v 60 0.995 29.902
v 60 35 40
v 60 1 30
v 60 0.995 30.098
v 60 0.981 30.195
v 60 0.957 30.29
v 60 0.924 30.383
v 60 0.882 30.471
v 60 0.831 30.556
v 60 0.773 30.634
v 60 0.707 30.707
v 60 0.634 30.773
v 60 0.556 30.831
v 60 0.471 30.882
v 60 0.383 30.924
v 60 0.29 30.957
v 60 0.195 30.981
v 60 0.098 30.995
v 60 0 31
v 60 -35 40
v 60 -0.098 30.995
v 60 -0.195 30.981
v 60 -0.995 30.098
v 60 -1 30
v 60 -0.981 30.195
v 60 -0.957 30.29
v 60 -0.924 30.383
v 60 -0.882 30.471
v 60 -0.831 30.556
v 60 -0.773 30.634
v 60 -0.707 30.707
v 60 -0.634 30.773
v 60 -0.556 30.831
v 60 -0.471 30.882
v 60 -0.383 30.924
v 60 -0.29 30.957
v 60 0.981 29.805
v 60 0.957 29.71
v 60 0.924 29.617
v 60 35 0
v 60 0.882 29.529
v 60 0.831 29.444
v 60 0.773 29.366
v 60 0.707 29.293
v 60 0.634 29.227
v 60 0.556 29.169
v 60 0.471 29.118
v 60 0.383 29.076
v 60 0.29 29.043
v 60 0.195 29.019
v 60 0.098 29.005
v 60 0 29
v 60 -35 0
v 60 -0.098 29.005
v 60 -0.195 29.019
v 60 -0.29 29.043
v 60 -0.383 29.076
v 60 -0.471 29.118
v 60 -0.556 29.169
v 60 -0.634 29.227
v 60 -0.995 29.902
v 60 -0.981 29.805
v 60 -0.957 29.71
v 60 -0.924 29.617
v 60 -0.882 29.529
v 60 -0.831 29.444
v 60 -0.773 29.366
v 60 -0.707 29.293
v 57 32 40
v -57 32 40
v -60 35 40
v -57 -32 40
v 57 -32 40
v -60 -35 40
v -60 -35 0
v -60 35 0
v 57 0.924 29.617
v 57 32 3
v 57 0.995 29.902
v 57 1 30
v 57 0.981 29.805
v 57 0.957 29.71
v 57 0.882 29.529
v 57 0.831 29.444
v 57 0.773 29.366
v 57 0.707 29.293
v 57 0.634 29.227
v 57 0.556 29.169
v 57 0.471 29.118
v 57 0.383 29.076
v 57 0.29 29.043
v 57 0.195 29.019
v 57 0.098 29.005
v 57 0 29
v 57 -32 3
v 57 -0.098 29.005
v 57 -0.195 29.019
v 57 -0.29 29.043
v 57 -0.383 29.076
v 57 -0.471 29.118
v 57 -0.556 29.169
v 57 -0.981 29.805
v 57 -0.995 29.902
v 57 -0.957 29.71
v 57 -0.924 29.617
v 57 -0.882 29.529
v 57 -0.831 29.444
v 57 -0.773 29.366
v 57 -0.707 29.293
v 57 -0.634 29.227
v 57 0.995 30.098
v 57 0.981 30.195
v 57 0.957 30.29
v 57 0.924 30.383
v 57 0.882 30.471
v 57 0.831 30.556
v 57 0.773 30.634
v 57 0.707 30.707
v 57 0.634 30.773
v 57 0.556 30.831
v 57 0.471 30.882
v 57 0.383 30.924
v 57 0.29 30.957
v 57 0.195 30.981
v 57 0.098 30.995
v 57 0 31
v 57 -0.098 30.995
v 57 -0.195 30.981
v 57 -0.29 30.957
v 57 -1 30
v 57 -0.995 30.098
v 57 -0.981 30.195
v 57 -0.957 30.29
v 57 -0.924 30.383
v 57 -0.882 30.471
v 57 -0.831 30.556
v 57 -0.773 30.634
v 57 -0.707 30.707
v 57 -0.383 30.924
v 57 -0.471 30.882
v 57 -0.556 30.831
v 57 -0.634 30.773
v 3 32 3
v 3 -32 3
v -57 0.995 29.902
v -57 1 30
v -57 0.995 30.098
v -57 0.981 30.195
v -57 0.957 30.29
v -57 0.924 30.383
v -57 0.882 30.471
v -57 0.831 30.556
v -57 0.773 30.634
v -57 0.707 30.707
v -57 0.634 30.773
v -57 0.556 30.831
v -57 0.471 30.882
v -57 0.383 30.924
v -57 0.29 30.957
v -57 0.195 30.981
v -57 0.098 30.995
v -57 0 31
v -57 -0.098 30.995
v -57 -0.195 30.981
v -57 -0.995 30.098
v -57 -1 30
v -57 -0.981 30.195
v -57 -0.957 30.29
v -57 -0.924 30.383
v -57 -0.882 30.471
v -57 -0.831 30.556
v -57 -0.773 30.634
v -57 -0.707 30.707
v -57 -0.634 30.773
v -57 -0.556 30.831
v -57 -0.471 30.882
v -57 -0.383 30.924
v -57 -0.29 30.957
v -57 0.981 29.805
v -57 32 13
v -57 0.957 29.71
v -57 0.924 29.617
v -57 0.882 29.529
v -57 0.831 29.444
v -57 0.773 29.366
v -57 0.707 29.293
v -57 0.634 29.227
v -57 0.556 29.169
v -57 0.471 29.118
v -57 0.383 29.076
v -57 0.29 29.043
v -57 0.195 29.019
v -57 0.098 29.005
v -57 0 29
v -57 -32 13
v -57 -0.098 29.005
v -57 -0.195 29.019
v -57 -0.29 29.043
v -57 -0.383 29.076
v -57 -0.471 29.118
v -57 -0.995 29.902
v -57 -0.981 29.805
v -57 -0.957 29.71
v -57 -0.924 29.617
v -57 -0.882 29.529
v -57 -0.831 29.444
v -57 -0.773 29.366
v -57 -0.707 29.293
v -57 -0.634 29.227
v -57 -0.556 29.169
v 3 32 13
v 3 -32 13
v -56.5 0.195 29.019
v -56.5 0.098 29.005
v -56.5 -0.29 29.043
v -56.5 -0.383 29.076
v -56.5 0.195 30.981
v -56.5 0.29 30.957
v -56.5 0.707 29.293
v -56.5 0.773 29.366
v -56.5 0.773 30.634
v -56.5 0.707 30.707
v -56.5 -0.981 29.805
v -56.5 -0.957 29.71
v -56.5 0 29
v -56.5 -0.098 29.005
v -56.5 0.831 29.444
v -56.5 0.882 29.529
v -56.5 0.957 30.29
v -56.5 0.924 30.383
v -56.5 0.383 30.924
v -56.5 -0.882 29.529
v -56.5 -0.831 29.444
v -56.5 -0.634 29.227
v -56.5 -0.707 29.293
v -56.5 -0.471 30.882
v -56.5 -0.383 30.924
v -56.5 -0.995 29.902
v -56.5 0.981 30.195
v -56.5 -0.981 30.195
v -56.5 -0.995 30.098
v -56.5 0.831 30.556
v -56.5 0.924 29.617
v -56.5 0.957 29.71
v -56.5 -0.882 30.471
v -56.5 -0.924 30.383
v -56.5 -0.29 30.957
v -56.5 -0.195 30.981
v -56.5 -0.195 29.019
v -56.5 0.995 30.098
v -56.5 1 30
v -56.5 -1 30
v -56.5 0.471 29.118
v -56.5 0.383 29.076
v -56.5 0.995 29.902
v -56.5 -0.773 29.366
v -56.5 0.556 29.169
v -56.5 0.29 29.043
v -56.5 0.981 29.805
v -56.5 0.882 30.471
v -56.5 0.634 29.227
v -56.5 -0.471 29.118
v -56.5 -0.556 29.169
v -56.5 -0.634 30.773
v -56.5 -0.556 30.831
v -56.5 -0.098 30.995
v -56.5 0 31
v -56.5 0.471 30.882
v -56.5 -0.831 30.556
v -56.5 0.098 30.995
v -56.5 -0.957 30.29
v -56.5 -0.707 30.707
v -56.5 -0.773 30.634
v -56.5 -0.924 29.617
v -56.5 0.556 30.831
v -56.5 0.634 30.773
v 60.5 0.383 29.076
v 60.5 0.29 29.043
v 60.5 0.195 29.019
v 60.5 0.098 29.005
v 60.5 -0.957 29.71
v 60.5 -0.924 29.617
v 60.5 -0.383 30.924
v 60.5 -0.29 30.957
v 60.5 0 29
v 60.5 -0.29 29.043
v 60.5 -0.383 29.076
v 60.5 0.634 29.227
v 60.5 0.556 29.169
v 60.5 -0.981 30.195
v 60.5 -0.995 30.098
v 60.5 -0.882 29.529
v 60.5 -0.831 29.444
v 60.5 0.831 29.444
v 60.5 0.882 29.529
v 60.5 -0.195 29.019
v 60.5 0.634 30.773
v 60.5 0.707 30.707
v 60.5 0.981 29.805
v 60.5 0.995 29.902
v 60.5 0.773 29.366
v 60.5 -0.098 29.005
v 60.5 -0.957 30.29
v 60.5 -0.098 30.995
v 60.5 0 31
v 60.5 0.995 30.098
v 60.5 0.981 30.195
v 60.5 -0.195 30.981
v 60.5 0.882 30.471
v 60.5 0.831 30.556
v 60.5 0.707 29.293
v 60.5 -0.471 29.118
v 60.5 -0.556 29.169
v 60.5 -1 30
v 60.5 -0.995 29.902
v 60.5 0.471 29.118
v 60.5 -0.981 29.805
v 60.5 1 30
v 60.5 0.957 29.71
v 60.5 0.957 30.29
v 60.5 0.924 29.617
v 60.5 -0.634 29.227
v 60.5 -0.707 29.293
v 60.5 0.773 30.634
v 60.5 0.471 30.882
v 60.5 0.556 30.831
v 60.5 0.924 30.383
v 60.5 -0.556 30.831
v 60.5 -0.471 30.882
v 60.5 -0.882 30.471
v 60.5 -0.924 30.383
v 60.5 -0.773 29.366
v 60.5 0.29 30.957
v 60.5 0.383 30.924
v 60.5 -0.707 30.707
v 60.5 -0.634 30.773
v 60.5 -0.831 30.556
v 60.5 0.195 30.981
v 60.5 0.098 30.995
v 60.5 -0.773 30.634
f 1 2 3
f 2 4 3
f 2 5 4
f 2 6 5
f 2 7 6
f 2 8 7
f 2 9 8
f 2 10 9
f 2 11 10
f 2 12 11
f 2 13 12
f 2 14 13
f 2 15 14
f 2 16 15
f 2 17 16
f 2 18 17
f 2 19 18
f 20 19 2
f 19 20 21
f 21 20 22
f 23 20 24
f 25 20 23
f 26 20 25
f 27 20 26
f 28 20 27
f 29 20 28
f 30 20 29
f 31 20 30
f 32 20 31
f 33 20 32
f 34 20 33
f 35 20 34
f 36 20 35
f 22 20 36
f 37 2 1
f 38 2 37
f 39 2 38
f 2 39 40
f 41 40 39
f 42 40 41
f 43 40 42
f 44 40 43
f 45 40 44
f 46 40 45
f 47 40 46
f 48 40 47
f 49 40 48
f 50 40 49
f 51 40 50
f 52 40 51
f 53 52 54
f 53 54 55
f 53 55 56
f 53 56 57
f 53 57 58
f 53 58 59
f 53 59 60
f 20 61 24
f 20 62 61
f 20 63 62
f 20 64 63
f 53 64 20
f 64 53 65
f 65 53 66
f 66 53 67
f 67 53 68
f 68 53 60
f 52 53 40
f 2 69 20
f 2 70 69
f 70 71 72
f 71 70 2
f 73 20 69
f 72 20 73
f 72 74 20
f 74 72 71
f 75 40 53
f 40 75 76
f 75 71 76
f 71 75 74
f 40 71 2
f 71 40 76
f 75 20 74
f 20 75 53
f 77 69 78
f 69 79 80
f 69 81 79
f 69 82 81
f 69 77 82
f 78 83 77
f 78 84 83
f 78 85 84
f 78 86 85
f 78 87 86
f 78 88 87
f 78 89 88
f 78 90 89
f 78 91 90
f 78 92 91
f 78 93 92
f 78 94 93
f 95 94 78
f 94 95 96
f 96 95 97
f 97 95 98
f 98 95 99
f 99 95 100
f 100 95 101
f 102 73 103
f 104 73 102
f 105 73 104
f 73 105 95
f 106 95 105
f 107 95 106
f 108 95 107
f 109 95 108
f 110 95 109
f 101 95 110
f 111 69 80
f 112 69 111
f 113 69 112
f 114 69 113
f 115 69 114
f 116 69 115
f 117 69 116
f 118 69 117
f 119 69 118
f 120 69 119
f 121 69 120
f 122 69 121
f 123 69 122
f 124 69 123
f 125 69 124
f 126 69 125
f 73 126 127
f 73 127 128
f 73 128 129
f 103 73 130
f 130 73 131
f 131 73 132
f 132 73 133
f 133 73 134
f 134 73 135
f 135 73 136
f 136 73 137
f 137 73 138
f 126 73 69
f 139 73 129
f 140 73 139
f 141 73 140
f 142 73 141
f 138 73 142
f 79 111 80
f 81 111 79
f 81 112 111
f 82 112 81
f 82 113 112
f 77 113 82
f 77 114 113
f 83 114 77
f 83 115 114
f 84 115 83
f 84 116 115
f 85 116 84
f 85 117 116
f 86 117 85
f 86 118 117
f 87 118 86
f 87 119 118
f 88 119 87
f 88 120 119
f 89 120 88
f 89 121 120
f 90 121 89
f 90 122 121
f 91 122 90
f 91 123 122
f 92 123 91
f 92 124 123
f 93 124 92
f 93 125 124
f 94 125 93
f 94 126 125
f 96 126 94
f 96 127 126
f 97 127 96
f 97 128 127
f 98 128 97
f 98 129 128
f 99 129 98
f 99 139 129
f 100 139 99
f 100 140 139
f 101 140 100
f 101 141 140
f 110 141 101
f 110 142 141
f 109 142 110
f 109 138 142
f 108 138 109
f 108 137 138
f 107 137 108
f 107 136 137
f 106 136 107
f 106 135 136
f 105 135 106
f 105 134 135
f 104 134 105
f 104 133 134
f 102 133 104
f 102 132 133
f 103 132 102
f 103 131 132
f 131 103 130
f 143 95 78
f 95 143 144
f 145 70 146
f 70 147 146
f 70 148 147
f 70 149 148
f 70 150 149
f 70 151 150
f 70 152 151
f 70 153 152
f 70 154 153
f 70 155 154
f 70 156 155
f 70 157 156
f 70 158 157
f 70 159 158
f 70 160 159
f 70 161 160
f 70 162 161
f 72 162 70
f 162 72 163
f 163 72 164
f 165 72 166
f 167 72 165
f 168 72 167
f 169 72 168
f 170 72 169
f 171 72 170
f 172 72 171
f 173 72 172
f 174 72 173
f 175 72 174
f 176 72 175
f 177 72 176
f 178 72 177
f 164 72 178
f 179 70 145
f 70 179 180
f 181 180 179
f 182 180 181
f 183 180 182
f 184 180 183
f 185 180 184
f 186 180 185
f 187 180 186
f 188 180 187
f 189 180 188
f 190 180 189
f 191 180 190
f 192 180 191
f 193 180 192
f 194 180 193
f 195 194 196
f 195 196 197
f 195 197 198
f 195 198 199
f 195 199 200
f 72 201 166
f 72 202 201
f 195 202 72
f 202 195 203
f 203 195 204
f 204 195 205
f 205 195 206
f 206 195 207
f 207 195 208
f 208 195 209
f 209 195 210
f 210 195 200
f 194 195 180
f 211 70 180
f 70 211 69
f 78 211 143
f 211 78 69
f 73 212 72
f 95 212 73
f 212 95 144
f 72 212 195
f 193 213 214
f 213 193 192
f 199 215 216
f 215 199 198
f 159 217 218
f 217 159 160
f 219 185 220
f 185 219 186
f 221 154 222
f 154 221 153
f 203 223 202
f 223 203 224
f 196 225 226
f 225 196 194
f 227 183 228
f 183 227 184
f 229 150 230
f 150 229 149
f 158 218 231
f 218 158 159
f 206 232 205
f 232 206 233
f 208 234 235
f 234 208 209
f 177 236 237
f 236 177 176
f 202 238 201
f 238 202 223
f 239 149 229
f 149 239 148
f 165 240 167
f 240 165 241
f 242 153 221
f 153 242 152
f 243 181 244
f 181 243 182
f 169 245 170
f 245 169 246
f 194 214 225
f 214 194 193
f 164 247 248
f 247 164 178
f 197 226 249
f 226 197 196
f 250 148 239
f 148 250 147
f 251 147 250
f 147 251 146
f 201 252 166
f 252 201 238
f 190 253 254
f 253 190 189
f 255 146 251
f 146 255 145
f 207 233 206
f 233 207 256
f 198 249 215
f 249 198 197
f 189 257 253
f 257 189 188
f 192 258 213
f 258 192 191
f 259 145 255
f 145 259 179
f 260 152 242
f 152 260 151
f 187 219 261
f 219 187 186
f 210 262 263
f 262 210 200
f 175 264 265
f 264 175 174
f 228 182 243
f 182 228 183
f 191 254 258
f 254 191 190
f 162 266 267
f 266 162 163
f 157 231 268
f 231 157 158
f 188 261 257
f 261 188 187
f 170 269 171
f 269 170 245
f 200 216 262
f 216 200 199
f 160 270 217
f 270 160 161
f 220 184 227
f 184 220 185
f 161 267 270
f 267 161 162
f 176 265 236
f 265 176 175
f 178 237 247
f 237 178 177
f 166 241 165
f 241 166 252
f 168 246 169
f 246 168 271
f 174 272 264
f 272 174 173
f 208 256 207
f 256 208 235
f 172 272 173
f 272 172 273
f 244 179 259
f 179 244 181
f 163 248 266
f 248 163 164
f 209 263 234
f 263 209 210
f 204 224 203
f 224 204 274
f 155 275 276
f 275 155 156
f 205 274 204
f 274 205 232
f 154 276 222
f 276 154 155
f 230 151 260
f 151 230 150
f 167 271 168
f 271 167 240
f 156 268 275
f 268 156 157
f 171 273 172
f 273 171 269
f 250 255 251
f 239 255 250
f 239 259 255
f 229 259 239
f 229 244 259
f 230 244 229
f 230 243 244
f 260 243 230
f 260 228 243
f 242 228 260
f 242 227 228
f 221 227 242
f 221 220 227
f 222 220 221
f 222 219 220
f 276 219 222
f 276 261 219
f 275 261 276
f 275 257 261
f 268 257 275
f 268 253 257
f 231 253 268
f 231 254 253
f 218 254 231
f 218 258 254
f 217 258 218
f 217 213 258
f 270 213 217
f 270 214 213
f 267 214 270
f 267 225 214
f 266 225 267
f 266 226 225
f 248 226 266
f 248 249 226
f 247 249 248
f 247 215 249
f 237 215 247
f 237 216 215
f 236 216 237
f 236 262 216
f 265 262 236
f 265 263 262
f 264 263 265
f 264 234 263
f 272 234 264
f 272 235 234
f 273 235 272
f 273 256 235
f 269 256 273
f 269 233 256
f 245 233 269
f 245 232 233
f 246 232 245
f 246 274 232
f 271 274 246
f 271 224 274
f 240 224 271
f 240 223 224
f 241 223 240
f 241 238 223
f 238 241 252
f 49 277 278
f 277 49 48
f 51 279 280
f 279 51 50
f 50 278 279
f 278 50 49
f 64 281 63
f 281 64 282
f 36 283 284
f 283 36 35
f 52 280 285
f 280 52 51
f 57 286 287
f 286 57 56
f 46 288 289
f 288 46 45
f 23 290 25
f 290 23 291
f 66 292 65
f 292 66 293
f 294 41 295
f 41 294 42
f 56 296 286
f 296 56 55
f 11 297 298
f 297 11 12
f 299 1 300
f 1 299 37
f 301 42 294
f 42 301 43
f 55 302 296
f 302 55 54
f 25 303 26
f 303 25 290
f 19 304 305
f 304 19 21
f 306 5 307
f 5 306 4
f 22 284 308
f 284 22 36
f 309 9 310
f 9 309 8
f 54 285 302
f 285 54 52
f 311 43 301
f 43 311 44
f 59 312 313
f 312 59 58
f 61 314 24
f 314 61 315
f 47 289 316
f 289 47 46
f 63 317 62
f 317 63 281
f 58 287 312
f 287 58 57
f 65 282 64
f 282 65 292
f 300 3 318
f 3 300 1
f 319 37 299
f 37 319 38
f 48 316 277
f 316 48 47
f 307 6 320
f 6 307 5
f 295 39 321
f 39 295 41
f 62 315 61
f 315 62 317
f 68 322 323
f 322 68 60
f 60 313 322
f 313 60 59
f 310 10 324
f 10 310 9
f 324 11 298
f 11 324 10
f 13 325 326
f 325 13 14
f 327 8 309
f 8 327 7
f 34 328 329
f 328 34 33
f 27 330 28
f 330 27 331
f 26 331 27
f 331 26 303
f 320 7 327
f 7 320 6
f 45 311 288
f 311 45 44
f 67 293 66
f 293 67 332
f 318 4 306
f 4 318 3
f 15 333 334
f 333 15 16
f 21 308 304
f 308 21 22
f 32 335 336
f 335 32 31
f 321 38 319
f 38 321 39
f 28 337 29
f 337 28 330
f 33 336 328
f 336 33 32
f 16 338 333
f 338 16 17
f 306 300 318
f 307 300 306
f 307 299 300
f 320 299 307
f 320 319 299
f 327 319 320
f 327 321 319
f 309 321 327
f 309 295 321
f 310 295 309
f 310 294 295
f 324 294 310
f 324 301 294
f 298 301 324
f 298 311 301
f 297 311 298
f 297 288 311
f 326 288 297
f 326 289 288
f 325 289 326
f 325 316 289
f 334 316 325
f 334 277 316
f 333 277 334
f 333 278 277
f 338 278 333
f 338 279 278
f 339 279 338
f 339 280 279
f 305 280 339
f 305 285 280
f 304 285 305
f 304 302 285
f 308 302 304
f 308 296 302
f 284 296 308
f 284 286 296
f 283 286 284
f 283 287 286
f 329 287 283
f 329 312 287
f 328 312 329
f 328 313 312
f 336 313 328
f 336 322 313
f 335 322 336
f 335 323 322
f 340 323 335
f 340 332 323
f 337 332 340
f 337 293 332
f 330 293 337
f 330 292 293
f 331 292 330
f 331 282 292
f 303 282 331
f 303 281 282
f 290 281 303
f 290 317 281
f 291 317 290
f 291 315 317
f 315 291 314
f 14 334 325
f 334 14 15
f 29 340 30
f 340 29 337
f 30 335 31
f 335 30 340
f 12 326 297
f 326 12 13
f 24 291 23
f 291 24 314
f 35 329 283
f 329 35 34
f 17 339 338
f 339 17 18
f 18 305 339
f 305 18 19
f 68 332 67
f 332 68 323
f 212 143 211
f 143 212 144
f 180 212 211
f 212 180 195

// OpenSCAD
// Mini horizontal gel-electrophoresis buffer tank
// Print orientation: base on XY plane, builds up +Z

$fn = 64;

// --- Tank dimensions ---
outer_x = 120;   // outer length in X
outer_y = 70;    // outer width in Y
height  = 40;    // overall height in Z
wall    = 3;     // wall thickness
floor   = 3;     // floor thickness

// --- Platform ---
plat_len   = 60;   // platform length in X
plat_top_z = 13;   // platform top height (10 mm above inner floor)

// --- Holes ---
hole_d = 2;       // electrode hole diameter
hole_y = 0;       // hole Y position
hole_z = 30;      // hole Z position

// --- Derived ---
inner_h = height - floor;              // inner floor height (37)
overlap = 0.5;                         // cutter overshoot

union() {
    // Main tank body (hollow)
    difference() {
        translate([-outer_x/2, -outer_y/2, 0])
            cube([outer_x, outer_y, height]);
        translate([-outer_x/2 + wall, -outer_y/2 + wall, floor])
            cube([outer_x - 2*wall, outer_y - 2*wall, inner_h]);
    }

    // Central raised platform
    translate([-outer_x/2 + wall, -outer_y/2 + wall, floor])
        cube([plat_len, outer_y - 2*wall, plat_top_z - floor]);

    // Electrode holes through end walls
    for (sx = [-1, 1])
        translate([sx > 0 ? outer_x/2 - wall : -outer_x/2, hole_y, hole_z])
            rotate([0, 90, 0])
                cylinder(d = hole_d, h = wall + overlap);
}
